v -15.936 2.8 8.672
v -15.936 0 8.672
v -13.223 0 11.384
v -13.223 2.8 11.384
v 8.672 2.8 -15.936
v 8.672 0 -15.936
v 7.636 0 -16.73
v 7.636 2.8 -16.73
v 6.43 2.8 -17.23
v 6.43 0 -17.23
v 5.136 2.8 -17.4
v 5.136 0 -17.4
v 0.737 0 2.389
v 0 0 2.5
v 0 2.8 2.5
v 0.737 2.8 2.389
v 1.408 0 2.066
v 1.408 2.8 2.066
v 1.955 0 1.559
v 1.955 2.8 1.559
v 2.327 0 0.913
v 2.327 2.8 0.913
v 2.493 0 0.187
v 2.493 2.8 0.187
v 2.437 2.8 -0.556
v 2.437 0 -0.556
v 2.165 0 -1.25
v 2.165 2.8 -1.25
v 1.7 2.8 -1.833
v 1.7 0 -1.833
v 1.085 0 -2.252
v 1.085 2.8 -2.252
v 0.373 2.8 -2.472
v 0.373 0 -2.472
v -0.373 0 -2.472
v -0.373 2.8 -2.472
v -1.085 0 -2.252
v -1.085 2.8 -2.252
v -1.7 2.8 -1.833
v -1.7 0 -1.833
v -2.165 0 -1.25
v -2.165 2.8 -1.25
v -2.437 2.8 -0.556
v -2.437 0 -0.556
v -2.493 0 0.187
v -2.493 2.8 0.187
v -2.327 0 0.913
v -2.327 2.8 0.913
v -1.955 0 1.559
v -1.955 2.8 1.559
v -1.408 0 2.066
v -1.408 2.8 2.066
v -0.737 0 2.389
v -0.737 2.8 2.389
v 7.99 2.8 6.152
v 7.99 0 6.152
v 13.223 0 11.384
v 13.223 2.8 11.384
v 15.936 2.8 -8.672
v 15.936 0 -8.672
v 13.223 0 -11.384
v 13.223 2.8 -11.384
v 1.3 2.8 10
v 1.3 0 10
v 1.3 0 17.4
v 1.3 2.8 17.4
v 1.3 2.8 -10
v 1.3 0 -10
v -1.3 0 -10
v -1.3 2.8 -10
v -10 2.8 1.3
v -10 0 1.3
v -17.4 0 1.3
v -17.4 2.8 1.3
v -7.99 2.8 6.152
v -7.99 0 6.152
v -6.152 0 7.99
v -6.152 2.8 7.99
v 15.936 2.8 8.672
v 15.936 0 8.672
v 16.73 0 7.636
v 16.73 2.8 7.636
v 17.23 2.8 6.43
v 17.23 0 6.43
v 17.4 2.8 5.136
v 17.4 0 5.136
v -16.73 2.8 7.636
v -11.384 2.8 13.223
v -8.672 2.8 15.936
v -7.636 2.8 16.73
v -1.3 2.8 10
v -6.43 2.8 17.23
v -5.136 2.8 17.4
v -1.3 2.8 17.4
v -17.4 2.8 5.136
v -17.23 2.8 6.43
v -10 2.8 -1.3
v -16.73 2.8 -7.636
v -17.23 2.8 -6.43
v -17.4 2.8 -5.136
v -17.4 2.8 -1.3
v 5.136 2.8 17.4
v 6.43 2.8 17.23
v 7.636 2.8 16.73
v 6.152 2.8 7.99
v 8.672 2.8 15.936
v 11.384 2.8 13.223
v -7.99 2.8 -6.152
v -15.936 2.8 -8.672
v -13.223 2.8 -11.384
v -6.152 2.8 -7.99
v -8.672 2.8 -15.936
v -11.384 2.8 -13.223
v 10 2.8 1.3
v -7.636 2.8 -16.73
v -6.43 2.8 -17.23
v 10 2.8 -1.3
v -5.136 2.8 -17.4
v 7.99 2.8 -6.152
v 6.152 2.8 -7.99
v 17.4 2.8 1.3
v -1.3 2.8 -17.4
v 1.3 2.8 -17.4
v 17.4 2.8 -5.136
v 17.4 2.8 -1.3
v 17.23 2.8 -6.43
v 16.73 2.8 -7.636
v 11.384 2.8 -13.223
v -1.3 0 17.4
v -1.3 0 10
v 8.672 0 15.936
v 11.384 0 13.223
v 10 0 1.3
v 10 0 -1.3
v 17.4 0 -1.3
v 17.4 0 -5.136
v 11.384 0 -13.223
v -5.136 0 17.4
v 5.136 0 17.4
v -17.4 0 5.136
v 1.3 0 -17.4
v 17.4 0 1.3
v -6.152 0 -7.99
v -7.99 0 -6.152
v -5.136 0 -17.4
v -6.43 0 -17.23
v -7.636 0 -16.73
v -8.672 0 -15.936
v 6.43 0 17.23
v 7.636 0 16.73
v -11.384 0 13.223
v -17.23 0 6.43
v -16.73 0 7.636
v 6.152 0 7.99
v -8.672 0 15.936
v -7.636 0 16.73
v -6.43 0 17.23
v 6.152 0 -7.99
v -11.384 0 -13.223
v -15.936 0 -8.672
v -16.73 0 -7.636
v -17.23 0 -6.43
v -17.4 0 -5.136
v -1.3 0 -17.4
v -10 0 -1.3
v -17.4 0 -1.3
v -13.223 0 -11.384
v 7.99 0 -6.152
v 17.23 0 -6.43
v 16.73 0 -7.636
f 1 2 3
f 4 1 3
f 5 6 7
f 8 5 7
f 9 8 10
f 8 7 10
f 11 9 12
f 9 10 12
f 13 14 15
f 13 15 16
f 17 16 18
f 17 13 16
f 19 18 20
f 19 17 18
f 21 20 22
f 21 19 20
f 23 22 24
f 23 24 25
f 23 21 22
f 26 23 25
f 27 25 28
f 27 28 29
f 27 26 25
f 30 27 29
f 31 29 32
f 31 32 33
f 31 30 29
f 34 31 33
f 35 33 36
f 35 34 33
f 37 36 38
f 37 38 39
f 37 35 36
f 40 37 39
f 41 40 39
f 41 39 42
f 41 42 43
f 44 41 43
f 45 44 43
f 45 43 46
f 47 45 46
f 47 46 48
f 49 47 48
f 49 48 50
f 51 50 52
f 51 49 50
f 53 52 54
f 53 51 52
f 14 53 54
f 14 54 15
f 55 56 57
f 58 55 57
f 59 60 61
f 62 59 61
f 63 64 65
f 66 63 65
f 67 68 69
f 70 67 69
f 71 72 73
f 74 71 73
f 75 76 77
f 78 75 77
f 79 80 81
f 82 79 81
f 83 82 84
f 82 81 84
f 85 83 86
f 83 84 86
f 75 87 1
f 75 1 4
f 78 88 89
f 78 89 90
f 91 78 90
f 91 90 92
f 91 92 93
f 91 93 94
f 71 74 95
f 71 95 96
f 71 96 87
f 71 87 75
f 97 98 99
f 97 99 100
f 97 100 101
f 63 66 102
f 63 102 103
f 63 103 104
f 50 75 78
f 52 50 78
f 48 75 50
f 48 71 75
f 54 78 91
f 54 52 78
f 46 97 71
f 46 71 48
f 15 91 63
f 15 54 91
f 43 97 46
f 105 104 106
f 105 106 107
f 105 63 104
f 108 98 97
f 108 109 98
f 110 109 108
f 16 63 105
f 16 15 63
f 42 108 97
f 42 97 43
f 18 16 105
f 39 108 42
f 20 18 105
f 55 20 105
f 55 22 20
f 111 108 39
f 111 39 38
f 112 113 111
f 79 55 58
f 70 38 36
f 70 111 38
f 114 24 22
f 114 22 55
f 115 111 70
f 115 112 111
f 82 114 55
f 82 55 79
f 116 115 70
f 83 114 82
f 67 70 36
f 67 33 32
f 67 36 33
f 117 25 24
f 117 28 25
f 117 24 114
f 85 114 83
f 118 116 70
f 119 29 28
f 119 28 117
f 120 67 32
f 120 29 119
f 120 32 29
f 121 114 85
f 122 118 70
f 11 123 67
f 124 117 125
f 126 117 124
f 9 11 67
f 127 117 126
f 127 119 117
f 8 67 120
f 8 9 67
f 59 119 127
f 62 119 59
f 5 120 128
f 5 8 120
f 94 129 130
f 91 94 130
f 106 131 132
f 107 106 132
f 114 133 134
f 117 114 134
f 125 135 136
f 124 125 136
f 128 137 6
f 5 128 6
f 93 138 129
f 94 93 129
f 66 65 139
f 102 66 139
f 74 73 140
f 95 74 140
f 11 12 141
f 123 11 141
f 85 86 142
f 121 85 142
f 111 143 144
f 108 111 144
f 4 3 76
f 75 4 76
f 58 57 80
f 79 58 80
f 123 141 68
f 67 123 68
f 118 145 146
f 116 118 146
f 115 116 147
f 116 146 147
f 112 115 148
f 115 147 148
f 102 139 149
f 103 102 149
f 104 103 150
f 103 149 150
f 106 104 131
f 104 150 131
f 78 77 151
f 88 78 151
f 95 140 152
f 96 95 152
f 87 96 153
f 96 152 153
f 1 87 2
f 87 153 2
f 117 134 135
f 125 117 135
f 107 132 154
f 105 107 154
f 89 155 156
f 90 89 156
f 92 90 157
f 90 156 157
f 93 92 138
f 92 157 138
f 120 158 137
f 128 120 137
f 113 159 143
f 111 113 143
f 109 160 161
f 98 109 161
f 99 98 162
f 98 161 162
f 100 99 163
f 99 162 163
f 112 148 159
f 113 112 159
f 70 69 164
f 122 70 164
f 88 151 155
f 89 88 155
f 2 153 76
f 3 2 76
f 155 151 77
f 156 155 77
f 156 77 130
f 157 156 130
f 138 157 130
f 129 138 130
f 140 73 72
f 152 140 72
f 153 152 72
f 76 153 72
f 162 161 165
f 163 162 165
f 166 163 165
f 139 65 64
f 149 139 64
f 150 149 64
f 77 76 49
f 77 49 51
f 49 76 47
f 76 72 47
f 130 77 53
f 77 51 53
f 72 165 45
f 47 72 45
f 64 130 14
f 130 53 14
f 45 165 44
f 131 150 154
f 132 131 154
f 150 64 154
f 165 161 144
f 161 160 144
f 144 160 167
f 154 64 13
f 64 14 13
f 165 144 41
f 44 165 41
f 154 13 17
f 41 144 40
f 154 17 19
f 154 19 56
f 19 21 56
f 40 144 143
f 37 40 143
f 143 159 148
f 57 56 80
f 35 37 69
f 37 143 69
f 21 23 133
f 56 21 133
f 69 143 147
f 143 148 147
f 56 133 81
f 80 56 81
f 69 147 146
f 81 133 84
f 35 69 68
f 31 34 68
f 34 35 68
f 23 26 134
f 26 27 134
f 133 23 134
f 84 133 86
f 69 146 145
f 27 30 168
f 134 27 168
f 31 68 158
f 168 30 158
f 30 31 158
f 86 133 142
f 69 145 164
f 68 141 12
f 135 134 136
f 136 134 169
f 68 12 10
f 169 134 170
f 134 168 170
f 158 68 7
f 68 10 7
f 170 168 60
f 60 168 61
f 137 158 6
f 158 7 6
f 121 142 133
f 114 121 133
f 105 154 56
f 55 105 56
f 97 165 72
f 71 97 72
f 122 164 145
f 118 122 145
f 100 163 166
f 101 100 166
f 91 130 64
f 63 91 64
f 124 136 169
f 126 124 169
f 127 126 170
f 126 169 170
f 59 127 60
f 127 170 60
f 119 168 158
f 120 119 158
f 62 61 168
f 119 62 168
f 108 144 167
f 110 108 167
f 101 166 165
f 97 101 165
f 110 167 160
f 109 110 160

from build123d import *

# Parameters (mm, degrees)
SKETCH1_R           = 2.5
BOSS_EXTRUDE1_DEPTH = 2.8


with BuildPart() as part:
    # Sketch1 → Boss-Extrude1 (new body)
    with BuildSketch(Plane(origin=(0, 0, 0), x_dir=(1, 0, 0), z_dir=(0, 1, 0))):
        with BuildLine():
            Line((-1.3, -17.4), (-1.3, -10))
            Line((-1.3, -10), (1.3, -10))
            Line((1.3, -10), (1.3, -17.4))
            Line((1.3, -17.4), (5.136248173, -17.4))
            ThreePointArc((5.136248173, -17.4), (7.049665335, -17.019397663), (8.671782079, -15.935533906))
            Line((8.671782079, -15.935533906), (11.384419177, -13.222896808))
            Line((11.384419177, -13.222896808), (6.151828996, -7.990306627))
            Line((6.151828996, -7.990306627), (7.990306627, -6.151828996))
            Line((7.990306627, -6.151828996), (13.222896808, -11.384419177))
            Line((13.222896808, -11.384419177), (15.935533906, -8.671782079))
            ThreePointArc((15.935533906, -8.671782079), (17.019397663, -7.049665335), (17.4, -5.136248173))
            Line((17.4, -5.136248173), (17.4, -1.3))
            Line((17.4, -1.3), (10, -1.3))
            Line((10, -1.3), (10, 1.3))
            Line((10, 1.3), (17.4, 1.3))
            Line((17.4, 1.3), (17.4, 5.136248173))
            ThreePointArc((17.4, 5.136248173), (17.019397663, 7.049665335), (15.935533906, 8.671782079))
            Line((15.935533906, 8.671782079), (13.222896808, 11.384419177))
            Line((13.222896808, 11.384419177), (7.990306627, 6.151828996))
            Line((7.990306627, 6.151828996), (6.151828996, 7.990306627))
            Line((6.151828996, 7.990306627), (11.384419177, 13.222896808))
            Line((11.384419177, 13.222896808), (8.671782079, 15.935533906))
            ThreePointArc((8.671782079, 15.935533906), (7.049665335, 17.019397663), (5.136248173, 17.4))
            Line((5.136248173, 17.4), (1.3, 17.4))
            Line((1.3, 17.4), (1.3, 10))
            Line((1.3, 10), (-1.3, 10))
            Line((-1.3, 10), (-1.3, 17.4))
            Line((-1.3, 17.4), (-5.136248173, 17.4))
            ThreePointArc((-5.136248173, 17.4), (-7.049665335, 17.019397663), (-8.671782079, 15.935533906))
            Line((-8.671782079, 15.935533906), (-11.384419177, 13.222896808))
            Line((-11.384419177, 13.222896808), (-6.151828996, 7.990306627))
            Line((-6.151828996, 7.990306627), (-7.990306627, 6.151828996))
            Line((-7.990306627, 6.151828996), (-13.222896808, 11.384419177))
            Line((-13.222896808, 11.384419177), (-15.935533906, 8.671782079))
            ThreePointArc((-15.935533906, 8.671782079), (-17.019397663, 7.049665335), (-17.4, 5.136248173))
            Line((-17.4, 5.136248173), (-17.4, 1.3))
            Line((-17.4, 1.3), (-10, 1.3))
            Line((-10, 1.3), (-10, -1.3))
            Line((-10, -1.3), (-17.4, -1.3))
            Line((-17.4, -1.3), (-17.4, -5.136248173))
            ThreePointArc((-17.4, -5.136248173), (-17.019397663, -7.049665335), (-15.935533906, -8.671782079))
            Line((-15.935533906, -8.671782079), (-13.222896808, -11.384419177))
            Line((-13.222896808, -11.384419177), (-7.990306627, -6.151828996))
            Line((-7.990306627, -6.151828996), (-6.151828996, -7.990306627))
            Line((-6.151828996, -7.990306627), (-11.384419177, -13.222896808))
            Line((-11.384419177, -13.222896808), (-8.671782079, -15.935533906))
            ThreePointArc((-8.671782079, -15.935533906), (-7.049665335, -17.019397663), (-5.136248173, -17.4))
            Line((-5.136248173, -17.4), (-1.3, -17.4))
        make_face()
        with Locations(Location((0, 0, 0), (0, 0, 270))):  # turned: the seam where the file's is
            Circle(SKETCH1_R, mode=Mode.SUBTRACT)
    extrude(amount=BOSS_EXTRUDE1_DEPTH)


solid = part.part
